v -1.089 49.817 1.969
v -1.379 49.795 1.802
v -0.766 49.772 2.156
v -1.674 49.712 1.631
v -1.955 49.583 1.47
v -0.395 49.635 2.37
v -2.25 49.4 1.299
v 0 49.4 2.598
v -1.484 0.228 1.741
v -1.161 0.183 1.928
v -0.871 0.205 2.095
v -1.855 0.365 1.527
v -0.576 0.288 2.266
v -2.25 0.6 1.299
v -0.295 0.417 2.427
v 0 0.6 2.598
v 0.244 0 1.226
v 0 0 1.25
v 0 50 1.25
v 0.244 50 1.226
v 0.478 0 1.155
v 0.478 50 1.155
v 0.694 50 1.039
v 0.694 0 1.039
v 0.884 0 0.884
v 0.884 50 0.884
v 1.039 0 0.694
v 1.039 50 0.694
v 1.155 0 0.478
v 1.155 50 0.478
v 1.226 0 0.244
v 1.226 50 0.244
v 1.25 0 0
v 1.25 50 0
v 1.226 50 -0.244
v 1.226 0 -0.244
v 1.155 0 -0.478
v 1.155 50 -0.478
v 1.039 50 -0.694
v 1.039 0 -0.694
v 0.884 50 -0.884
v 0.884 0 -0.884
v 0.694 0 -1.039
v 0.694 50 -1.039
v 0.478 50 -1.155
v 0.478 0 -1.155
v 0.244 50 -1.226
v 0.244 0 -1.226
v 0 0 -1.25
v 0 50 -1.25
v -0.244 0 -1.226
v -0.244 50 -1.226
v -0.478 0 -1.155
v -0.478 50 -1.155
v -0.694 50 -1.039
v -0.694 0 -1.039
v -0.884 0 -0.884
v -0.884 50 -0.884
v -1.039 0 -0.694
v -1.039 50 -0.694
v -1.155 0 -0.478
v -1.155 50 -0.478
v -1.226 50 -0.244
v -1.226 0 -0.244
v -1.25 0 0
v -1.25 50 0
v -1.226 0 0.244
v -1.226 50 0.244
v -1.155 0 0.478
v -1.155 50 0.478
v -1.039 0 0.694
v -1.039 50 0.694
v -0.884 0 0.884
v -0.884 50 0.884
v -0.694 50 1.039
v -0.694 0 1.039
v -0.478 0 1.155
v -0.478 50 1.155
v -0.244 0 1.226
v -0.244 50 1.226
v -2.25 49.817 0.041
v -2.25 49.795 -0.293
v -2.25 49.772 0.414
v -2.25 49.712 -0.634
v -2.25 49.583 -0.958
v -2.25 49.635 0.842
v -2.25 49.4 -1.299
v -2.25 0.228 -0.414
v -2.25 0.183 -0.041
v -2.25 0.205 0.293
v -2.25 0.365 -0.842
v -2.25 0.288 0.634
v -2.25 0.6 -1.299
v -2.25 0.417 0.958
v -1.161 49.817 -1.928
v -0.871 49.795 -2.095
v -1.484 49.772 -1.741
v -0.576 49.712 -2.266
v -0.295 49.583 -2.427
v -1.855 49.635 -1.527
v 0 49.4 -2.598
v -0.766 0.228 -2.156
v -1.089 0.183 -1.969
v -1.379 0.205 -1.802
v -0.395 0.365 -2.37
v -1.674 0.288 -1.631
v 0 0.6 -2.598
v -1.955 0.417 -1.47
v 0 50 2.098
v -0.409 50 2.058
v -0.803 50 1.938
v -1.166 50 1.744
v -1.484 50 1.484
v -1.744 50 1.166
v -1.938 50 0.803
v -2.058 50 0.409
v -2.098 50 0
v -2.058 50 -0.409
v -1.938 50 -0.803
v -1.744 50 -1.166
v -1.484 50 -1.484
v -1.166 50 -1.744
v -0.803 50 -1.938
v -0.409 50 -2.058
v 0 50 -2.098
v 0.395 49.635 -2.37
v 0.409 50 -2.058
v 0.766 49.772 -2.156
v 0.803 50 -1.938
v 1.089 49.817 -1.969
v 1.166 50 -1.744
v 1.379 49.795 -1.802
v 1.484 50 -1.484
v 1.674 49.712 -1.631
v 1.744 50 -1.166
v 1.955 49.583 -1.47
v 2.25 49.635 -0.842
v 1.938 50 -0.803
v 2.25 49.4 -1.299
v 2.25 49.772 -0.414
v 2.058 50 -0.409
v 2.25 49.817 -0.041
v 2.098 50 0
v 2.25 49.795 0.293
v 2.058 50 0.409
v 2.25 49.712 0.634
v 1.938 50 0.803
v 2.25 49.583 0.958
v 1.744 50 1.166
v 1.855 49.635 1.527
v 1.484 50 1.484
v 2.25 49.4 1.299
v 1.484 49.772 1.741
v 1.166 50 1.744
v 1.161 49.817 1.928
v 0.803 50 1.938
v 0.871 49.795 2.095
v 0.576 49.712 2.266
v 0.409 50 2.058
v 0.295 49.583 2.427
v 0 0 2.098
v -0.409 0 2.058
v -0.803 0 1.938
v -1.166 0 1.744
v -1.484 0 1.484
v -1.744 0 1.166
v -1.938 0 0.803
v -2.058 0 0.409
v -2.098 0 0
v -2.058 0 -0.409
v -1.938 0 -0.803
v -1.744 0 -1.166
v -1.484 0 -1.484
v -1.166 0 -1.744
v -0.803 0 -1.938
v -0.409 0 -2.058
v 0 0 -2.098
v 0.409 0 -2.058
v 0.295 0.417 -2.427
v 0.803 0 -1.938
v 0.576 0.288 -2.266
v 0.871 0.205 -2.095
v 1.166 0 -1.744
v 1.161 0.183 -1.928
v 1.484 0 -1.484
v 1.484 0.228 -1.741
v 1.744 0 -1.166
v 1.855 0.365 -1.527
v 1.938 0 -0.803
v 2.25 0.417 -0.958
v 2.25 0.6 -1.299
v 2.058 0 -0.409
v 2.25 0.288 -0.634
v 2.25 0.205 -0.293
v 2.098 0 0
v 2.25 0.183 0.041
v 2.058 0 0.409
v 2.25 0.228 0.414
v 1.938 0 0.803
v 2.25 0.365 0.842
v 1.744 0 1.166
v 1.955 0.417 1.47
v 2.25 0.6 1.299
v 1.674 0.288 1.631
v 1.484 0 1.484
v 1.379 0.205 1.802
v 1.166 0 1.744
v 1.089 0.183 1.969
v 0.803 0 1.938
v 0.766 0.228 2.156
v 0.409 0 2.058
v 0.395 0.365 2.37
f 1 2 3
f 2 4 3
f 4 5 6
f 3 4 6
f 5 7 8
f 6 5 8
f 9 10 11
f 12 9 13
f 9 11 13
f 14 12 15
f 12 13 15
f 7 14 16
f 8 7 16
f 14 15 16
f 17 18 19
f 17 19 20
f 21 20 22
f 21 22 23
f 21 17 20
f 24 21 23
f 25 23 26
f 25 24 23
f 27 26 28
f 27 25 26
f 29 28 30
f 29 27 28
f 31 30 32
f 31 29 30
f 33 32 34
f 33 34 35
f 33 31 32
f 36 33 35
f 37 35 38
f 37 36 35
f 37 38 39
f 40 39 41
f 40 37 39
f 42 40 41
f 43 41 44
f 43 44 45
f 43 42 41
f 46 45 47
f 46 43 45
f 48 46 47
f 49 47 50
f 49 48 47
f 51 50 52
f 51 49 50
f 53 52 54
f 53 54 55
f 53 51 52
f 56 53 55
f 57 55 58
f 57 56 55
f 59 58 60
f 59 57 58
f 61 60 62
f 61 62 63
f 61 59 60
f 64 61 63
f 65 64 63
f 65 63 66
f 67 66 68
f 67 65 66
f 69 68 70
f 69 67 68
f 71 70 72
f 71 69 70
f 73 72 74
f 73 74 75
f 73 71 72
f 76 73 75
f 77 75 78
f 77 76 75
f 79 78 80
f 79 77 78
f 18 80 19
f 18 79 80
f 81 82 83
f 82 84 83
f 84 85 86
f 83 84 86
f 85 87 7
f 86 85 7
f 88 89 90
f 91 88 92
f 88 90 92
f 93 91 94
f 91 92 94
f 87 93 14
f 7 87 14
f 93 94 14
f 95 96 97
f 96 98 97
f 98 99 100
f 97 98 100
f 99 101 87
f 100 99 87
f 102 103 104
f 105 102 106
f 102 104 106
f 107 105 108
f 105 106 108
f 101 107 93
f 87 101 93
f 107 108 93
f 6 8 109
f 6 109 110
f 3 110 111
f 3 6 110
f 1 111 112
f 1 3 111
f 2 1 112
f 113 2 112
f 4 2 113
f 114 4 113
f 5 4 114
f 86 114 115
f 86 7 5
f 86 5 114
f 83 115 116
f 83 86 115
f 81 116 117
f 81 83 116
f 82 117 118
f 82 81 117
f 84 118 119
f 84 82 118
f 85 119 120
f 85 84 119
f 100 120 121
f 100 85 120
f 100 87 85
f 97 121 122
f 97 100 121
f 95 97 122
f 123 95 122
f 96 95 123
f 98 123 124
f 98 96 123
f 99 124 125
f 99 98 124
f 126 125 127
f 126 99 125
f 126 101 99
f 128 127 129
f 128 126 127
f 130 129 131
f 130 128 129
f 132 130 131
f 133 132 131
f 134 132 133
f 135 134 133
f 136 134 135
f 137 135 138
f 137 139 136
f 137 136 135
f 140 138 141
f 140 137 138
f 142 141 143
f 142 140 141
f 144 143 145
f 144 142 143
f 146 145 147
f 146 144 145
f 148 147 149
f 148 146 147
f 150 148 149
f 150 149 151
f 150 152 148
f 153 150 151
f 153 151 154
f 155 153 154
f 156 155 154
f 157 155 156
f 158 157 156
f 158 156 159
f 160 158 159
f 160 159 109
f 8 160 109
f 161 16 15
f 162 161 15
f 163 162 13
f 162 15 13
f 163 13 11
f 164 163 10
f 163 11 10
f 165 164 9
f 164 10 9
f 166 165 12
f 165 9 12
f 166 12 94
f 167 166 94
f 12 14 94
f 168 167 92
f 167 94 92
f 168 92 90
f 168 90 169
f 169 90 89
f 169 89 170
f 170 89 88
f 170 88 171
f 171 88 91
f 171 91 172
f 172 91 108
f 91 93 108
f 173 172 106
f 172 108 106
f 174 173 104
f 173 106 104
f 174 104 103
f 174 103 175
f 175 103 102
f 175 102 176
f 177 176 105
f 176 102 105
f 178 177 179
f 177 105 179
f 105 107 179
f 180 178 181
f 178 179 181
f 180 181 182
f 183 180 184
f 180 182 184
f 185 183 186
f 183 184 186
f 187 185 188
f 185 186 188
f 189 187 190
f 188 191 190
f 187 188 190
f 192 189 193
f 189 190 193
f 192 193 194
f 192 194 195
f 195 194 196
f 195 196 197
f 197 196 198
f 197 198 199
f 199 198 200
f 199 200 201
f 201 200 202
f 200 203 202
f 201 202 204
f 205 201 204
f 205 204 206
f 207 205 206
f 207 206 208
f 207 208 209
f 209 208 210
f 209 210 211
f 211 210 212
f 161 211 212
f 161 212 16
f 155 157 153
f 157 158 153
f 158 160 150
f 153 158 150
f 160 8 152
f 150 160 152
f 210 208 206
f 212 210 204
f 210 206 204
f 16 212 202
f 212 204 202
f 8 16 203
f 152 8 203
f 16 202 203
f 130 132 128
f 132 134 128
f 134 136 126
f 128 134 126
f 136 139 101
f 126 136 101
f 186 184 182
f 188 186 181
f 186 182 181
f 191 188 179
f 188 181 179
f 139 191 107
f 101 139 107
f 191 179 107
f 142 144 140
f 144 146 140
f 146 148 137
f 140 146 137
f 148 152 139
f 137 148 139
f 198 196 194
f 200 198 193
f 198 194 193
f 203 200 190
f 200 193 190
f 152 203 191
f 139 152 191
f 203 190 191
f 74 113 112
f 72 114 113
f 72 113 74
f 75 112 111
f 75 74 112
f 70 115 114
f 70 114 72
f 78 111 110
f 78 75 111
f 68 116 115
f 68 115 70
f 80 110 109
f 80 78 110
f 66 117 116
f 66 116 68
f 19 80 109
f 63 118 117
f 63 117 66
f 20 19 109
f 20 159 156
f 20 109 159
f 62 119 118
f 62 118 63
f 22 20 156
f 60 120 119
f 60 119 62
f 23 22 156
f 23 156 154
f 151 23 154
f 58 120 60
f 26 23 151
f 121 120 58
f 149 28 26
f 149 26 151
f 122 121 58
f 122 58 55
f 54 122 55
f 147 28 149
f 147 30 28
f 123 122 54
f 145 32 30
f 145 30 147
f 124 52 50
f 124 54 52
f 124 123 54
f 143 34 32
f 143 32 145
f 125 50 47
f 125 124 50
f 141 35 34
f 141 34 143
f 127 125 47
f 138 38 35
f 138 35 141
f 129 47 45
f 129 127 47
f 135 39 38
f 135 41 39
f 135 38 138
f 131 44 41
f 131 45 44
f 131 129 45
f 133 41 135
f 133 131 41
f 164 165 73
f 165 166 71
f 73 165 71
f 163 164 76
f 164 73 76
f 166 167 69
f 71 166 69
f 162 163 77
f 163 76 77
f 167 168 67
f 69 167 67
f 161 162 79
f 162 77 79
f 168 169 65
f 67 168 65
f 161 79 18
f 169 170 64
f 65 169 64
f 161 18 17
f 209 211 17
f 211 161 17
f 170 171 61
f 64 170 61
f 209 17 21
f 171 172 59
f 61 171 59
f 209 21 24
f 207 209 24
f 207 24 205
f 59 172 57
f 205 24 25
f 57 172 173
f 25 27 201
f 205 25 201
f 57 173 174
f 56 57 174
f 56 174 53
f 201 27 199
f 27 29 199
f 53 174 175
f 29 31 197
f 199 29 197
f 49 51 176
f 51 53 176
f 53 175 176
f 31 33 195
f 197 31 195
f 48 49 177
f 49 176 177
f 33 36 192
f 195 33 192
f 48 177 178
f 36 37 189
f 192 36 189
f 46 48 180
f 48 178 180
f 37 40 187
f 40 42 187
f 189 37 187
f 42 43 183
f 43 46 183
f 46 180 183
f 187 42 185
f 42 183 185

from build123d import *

# Parameters (mm, degrees)
SKETCH1_R           = 1.25
BOSS_EXTRUDE1_DEPTH = 50


with BuildPart() as part:
    # Sketch1 → Boss-Extrude1 (new body)
    with BuildSketch(Plane(origin=(0, 0, 0), x_dir=(1, 0, 0), z_dir=(0, 1, 0))):
        Polygon((0, 2.598076211), (-2.25, 1.299038106), (-2.25, -1.299038106), (0, -2.598076211), (2.25, -1.299038106), (2.25, 1.299038106), align=None)
        with Locations(Location((0, 0, 0), (0, 0, 270))):
            Circle(SKETCH1_R, mode=Mode.SUBTRACT)
    extrude(amount=BOSS_EXTRUDE1_DEPTH)

    # Sketch2 → Cut-Revolve1 (revolve, cut)
    with BuildSketch(Plane(origin=(0, 0, 0), x_dir=(0, 0, -1), z_dir=(1, 0, 0))):
        Polygon((-2.098076211, 50), (-2.598076211, 49.4), (-2.598076211, 50), align=None)
    cut_revolve1 = revolve(axis=Axis((0, 50, 0), (0, -1, 0)), mode=Mode.SUBTRACT)

    # Mirror1: Cut-Revolve1 across plane
    add(cut_revolve1.mirror(Plane.ZX.offset(25)), mode=Mode.SUBTRACT)


solid = part.part
